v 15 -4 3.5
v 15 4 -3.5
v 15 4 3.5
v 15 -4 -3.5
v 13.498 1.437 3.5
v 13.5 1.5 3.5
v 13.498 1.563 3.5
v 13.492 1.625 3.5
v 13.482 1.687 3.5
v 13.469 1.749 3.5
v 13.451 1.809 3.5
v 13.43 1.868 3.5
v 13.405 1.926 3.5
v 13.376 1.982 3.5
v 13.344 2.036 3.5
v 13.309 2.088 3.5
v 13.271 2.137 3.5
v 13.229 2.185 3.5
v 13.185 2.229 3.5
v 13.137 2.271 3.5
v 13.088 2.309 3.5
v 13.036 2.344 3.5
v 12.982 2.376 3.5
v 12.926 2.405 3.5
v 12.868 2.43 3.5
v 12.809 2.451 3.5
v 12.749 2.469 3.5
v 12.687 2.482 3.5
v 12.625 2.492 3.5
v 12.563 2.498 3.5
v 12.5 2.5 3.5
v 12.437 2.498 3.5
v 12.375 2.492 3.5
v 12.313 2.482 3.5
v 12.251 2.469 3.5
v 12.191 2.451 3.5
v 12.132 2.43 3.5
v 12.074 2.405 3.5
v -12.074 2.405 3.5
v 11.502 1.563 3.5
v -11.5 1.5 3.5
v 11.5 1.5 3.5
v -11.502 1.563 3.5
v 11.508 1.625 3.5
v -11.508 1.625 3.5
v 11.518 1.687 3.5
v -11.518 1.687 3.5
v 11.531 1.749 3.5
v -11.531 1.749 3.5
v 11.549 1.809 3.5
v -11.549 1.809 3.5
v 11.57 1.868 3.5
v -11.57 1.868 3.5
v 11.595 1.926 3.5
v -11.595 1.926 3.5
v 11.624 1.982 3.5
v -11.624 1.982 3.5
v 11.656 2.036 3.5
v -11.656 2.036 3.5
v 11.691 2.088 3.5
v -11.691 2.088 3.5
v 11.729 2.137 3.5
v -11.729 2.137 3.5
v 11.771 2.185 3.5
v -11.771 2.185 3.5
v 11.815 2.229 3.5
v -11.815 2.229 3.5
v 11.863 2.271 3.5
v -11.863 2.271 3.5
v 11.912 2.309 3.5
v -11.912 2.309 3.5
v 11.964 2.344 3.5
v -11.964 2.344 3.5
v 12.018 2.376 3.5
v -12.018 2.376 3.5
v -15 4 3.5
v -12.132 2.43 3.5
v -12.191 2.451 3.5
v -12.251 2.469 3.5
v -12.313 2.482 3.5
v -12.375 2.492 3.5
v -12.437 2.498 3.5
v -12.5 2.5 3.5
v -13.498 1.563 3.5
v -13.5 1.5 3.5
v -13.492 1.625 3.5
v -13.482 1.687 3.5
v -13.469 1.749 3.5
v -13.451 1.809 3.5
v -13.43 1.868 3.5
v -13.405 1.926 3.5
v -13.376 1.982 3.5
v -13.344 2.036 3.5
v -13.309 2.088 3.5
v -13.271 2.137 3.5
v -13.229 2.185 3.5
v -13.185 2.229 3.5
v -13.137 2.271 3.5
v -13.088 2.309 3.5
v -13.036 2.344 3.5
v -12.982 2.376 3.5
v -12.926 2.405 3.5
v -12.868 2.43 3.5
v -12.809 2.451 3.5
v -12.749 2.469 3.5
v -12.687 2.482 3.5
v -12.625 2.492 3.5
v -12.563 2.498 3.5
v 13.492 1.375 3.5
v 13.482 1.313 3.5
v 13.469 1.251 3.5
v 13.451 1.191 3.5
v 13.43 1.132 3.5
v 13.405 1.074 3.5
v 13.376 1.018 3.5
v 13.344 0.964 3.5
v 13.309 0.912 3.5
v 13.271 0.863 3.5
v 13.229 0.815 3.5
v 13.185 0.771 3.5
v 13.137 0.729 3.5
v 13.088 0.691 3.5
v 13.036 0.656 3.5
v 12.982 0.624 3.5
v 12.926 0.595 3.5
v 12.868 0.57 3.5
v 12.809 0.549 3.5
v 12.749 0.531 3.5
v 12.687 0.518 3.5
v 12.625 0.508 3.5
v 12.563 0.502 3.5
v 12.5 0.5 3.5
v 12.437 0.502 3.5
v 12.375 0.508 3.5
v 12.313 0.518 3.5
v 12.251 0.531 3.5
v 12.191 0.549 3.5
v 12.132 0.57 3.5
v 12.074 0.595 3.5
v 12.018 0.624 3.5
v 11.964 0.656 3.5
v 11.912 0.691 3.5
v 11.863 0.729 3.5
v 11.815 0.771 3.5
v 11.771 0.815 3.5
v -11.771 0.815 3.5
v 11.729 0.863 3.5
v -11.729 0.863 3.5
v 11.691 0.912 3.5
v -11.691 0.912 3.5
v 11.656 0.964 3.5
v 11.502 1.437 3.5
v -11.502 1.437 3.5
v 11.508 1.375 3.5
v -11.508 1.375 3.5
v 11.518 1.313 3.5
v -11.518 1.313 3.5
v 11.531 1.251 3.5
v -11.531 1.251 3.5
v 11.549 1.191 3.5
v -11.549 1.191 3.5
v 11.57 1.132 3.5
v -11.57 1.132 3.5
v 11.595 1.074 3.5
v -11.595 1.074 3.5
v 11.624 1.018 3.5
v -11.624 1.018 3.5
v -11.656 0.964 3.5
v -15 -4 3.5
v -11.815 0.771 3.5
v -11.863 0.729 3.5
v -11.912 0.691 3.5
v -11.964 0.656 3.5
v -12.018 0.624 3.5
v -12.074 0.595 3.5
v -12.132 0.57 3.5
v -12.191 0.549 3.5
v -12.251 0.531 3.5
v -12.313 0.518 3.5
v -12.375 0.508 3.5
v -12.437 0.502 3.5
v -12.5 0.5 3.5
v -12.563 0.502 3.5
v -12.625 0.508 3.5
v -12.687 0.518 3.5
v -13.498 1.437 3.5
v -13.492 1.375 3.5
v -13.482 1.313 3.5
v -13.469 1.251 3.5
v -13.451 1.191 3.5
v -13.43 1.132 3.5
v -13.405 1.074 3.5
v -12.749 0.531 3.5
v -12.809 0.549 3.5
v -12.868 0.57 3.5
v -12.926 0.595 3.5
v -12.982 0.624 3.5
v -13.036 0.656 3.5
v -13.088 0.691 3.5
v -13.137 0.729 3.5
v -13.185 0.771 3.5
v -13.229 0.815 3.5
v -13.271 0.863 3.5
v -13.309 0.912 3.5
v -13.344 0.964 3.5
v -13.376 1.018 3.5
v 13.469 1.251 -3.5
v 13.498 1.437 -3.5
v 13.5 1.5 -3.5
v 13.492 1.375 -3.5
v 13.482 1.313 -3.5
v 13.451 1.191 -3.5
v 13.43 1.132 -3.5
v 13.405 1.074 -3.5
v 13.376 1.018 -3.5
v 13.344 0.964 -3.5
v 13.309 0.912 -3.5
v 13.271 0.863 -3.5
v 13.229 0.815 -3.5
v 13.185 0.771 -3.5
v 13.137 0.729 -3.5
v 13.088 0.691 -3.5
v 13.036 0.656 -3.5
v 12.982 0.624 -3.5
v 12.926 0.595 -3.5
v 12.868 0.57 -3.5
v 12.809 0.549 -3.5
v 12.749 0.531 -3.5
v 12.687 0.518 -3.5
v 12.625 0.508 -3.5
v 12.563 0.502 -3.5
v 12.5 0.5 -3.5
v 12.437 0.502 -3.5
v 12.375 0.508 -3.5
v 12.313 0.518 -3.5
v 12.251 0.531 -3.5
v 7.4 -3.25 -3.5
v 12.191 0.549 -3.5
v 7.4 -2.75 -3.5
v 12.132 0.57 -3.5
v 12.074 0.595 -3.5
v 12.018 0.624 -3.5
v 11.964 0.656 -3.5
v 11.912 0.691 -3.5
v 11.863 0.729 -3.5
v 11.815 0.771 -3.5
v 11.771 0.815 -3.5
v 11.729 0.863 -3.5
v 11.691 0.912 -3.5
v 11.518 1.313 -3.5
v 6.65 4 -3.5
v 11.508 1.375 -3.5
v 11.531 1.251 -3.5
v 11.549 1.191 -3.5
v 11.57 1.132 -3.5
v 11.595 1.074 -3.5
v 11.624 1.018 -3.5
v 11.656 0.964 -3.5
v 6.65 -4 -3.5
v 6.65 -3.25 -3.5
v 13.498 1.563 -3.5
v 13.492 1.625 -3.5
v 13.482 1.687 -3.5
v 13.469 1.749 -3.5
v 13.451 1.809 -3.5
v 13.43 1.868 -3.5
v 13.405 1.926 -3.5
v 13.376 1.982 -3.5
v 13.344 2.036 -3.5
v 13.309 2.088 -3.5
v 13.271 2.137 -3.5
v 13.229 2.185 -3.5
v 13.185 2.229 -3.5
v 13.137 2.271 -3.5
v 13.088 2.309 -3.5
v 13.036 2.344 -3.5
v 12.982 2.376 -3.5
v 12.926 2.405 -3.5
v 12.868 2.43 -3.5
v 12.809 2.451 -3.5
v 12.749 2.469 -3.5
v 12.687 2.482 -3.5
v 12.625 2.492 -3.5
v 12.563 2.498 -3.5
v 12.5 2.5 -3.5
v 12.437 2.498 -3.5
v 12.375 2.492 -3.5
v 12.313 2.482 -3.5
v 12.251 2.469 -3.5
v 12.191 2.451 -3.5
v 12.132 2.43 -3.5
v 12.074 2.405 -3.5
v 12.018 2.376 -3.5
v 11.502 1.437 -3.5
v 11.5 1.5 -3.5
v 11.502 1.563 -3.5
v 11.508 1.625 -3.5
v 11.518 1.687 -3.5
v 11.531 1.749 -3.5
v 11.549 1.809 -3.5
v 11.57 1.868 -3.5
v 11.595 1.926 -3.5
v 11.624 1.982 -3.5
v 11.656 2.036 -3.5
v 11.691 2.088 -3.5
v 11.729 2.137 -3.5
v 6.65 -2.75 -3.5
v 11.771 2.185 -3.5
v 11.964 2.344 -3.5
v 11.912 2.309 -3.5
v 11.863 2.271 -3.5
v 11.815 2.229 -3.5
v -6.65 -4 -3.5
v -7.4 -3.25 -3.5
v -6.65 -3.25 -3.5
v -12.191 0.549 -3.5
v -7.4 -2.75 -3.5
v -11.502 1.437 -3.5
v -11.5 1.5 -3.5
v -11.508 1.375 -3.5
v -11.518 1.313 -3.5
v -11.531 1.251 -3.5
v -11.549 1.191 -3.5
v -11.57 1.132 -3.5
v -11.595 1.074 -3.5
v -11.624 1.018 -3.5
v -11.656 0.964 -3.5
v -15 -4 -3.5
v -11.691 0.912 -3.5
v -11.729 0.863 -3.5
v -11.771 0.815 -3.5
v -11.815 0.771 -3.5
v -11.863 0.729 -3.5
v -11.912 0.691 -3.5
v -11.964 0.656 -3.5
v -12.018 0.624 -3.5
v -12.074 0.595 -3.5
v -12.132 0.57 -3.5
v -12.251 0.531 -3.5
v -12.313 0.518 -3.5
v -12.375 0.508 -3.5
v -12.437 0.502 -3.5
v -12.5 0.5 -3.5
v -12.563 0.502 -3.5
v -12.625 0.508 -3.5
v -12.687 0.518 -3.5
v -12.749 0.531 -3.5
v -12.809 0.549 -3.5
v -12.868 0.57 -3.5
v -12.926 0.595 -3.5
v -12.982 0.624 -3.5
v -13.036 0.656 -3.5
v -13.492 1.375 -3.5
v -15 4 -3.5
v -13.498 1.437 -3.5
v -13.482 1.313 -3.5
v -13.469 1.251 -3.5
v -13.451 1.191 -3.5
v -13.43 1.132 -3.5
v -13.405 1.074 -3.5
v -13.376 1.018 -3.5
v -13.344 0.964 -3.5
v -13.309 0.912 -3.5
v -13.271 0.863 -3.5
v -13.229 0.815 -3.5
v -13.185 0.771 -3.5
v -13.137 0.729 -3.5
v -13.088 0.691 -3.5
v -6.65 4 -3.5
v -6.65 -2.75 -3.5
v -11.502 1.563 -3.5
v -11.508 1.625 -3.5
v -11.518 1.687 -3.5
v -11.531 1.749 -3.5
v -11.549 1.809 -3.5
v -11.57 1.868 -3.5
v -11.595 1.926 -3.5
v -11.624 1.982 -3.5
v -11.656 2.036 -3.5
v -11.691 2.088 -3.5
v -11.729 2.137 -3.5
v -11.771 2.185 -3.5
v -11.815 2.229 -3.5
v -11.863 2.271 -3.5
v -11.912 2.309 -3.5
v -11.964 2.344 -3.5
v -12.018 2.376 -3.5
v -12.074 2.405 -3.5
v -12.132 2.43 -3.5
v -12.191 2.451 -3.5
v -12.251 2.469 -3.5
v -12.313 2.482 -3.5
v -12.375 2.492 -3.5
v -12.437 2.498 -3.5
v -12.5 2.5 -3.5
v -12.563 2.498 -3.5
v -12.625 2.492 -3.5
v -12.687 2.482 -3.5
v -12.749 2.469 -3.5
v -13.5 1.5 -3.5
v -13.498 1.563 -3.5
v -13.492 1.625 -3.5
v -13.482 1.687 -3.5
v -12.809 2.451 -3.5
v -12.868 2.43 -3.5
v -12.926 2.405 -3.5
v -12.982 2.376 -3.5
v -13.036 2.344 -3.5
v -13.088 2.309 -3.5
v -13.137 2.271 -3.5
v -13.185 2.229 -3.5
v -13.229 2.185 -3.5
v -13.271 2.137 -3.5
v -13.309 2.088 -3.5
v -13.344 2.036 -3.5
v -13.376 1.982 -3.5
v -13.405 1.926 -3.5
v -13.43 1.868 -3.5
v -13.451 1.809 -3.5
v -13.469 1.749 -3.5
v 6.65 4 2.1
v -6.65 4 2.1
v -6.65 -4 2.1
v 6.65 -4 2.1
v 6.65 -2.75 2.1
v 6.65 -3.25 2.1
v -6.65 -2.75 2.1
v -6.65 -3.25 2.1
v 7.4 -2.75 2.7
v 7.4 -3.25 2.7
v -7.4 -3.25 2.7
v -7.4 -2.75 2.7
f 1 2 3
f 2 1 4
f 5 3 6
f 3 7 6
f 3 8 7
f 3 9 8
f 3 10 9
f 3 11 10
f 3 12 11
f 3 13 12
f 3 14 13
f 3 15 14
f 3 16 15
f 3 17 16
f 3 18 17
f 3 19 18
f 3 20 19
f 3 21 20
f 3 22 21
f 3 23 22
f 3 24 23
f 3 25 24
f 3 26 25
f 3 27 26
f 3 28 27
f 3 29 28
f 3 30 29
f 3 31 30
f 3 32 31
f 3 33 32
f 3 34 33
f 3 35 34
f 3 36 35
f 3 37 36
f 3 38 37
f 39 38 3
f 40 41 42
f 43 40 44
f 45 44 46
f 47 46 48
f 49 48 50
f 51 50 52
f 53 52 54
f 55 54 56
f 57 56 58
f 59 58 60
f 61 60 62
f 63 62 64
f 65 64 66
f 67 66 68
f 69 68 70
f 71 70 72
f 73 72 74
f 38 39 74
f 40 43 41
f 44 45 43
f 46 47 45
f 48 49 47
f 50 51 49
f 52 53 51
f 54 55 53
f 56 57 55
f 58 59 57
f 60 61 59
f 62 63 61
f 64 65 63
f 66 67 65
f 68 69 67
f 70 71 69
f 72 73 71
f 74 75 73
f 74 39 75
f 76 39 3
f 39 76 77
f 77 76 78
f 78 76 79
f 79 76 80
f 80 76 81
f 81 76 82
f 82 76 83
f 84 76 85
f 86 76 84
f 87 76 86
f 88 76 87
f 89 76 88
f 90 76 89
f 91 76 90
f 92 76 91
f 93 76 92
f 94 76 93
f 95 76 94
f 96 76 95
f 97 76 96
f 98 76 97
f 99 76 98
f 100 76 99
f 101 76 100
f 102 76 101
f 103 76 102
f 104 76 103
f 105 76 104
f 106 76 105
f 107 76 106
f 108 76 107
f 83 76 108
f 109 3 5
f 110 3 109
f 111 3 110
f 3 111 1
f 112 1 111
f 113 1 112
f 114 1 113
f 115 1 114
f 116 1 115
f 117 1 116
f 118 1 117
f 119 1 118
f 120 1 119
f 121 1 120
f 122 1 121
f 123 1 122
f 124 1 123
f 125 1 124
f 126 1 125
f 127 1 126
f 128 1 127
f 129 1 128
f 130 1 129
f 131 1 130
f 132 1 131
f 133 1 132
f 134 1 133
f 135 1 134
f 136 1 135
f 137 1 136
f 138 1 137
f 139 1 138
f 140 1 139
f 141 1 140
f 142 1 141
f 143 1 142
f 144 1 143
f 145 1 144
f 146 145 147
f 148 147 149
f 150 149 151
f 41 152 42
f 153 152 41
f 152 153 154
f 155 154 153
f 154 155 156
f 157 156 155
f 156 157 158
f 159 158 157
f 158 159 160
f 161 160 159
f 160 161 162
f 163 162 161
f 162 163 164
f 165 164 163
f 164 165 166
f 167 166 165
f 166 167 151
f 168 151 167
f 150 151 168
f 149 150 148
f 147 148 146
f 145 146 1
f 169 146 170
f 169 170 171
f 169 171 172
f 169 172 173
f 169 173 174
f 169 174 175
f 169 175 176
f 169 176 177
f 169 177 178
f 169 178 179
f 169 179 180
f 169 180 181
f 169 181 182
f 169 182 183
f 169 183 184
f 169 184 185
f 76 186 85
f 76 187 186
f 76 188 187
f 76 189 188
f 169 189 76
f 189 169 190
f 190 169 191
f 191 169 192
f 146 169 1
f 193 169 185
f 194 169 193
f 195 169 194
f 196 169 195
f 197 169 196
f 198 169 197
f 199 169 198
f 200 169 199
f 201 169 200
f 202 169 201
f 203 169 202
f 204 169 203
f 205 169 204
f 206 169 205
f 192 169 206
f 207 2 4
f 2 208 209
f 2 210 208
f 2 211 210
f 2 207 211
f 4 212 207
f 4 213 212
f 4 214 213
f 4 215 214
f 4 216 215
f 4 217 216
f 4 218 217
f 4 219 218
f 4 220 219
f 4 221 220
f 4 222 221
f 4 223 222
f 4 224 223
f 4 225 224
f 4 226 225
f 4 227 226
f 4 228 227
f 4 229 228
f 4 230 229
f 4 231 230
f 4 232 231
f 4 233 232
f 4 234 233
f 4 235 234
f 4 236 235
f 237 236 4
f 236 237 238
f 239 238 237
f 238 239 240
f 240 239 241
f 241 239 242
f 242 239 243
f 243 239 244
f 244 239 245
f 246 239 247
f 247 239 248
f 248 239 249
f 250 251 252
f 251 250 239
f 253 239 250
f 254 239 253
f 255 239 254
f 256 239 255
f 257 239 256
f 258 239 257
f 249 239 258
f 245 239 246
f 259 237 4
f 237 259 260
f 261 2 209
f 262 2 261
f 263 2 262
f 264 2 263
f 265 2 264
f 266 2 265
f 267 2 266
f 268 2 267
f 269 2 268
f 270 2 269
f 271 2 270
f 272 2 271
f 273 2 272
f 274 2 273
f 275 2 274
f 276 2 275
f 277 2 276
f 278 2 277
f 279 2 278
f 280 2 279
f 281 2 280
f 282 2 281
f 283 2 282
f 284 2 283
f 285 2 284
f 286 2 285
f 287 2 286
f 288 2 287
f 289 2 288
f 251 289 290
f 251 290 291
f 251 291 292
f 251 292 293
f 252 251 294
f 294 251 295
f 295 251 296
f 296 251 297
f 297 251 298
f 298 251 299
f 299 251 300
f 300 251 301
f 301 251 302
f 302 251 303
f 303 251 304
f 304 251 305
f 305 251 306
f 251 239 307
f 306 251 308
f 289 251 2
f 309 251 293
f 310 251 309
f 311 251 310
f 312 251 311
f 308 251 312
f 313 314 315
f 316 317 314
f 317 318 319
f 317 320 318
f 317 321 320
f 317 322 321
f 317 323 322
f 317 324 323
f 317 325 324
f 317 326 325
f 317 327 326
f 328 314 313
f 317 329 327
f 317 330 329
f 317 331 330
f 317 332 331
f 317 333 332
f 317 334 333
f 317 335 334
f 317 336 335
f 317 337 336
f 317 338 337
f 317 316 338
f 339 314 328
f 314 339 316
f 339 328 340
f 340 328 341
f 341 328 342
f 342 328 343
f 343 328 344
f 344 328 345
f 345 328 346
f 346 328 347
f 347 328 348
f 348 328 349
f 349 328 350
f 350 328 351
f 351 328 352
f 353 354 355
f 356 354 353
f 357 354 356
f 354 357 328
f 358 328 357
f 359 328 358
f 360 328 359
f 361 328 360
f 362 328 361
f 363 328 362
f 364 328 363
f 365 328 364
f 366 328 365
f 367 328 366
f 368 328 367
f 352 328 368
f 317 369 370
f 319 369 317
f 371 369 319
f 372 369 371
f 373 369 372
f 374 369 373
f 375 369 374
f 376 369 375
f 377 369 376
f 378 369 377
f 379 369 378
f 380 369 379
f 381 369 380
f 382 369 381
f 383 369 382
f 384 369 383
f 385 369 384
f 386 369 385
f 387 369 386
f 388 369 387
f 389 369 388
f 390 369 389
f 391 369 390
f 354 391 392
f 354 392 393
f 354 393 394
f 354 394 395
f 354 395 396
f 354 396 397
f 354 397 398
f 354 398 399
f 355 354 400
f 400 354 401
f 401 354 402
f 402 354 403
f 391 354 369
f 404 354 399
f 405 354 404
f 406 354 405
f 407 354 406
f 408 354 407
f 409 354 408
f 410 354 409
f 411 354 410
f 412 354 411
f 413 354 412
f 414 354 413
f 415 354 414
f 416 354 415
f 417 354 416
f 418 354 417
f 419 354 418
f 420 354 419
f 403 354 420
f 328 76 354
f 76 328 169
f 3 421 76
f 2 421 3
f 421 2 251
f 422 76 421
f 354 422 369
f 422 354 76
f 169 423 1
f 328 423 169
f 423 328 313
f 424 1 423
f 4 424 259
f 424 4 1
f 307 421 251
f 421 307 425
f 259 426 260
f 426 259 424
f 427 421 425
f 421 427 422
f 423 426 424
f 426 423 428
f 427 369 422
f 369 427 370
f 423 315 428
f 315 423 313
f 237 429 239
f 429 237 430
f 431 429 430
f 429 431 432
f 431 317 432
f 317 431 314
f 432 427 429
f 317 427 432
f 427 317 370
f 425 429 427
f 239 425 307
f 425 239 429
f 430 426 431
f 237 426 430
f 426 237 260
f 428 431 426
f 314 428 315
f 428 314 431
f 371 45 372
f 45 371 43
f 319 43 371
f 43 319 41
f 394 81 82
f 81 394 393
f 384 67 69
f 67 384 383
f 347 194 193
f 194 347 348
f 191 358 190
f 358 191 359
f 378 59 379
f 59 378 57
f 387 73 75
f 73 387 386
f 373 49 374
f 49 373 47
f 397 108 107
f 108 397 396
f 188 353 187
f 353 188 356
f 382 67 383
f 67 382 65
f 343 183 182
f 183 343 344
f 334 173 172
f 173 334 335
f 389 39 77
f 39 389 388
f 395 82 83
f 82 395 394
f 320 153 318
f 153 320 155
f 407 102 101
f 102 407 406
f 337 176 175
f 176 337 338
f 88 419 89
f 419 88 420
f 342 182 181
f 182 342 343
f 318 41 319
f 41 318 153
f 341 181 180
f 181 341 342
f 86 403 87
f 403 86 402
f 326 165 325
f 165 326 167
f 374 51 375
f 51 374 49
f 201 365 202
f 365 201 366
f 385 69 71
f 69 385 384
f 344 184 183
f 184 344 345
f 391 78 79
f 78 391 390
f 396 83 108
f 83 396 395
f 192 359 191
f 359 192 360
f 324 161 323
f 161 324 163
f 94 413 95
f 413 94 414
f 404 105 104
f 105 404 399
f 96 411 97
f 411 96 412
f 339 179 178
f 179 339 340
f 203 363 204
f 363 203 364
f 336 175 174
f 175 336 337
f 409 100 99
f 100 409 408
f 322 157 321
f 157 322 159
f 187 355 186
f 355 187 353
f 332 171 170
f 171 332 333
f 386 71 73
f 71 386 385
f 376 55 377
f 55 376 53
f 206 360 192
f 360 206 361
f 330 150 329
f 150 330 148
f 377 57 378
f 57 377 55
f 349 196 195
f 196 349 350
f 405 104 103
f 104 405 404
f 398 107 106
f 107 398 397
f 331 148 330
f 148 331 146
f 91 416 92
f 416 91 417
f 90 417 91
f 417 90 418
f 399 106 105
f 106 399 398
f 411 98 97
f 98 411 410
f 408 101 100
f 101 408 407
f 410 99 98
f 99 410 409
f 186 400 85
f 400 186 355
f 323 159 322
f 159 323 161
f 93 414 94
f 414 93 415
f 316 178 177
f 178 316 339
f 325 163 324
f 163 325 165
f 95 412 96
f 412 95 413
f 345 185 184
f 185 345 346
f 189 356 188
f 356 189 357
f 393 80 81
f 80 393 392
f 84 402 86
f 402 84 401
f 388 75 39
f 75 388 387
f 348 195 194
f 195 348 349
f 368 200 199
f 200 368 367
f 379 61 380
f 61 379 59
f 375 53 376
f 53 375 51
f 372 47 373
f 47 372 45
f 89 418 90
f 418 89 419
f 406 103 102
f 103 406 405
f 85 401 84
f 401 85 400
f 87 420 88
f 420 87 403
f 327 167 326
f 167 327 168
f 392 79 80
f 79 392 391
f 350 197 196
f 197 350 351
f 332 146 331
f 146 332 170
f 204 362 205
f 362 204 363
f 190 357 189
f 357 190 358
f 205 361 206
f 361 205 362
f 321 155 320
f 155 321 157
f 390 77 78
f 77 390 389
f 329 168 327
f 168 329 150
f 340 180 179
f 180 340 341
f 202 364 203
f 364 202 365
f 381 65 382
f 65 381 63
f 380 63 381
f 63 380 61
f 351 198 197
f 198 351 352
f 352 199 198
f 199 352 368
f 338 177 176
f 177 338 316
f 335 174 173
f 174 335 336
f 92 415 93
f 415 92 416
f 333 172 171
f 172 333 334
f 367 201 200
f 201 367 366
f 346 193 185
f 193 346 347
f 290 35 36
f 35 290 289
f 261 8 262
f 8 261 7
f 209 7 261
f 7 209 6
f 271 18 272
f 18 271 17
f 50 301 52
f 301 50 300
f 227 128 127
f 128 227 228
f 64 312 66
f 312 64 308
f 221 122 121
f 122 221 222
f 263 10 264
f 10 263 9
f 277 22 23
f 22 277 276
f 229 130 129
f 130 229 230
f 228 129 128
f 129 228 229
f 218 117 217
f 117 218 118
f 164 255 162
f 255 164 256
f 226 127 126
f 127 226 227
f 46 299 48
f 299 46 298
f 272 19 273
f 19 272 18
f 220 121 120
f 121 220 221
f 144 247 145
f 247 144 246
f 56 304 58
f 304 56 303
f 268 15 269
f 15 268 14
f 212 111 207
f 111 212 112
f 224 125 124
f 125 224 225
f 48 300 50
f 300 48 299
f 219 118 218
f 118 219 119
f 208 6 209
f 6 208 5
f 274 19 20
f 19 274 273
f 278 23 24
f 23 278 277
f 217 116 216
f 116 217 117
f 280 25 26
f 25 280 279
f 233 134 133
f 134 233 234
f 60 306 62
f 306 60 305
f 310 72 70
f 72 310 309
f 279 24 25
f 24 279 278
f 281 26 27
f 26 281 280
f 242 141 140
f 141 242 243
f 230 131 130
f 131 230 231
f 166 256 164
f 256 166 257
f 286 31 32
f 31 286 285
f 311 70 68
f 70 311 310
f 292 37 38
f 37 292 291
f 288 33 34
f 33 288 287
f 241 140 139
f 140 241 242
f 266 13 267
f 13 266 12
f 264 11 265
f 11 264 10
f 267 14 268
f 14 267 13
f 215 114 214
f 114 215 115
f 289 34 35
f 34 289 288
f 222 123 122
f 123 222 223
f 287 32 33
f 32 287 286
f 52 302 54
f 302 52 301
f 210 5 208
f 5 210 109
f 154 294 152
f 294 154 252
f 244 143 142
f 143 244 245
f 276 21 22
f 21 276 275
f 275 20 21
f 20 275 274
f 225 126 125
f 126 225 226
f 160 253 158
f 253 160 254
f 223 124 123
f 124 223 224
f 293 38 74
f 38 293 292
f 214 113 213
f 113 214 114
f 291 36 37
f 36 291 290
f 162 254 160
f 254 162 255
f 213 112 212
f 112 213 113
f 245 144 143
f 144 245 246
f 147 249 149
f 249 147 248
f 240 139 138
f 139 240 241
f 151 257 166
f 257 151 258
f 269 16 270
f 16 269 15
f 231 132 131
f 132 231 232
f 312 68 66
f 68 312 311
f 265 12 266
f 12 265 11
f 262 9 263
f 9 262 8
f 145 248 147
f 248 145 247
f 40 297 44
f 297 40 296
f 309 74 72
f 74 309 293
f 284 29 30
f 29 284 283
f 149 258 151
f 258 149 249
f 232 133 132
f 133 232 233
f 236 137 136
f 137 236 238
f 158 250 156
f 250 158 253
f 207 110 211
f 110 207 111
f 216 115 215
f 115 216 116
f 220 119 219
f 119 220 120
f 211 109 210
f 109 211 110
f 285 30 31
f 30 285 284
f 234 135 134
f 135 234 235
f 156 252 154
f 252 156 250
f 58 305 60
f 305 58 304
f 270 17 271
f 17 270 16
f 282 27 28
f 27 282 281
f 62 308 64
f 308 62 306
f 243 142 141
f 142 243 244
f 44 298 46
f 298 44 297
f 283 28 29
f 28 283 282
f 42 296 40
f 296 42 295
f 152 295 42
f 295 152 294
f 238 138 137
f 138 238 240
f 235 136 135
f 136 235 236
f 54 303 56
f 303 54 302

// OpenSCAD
fn=100;

difference() {
cube([30,8,7], true);

translate([0, 0, -((7-5.6)/2)])
cube([13.3,9,5.6], true);

translate([0, -3, -((7-6.2)/2)])
cube([14.8,0.5,6.2], true);

translate([(-12.5),1.5,0])    
cylinder(30, 2/2, 2/2, true, $fn=fn);
    
translate([(+12.5),1.5,0])    
cylinder(30, 2/2, 2/2, true, $fn=fn);
}
